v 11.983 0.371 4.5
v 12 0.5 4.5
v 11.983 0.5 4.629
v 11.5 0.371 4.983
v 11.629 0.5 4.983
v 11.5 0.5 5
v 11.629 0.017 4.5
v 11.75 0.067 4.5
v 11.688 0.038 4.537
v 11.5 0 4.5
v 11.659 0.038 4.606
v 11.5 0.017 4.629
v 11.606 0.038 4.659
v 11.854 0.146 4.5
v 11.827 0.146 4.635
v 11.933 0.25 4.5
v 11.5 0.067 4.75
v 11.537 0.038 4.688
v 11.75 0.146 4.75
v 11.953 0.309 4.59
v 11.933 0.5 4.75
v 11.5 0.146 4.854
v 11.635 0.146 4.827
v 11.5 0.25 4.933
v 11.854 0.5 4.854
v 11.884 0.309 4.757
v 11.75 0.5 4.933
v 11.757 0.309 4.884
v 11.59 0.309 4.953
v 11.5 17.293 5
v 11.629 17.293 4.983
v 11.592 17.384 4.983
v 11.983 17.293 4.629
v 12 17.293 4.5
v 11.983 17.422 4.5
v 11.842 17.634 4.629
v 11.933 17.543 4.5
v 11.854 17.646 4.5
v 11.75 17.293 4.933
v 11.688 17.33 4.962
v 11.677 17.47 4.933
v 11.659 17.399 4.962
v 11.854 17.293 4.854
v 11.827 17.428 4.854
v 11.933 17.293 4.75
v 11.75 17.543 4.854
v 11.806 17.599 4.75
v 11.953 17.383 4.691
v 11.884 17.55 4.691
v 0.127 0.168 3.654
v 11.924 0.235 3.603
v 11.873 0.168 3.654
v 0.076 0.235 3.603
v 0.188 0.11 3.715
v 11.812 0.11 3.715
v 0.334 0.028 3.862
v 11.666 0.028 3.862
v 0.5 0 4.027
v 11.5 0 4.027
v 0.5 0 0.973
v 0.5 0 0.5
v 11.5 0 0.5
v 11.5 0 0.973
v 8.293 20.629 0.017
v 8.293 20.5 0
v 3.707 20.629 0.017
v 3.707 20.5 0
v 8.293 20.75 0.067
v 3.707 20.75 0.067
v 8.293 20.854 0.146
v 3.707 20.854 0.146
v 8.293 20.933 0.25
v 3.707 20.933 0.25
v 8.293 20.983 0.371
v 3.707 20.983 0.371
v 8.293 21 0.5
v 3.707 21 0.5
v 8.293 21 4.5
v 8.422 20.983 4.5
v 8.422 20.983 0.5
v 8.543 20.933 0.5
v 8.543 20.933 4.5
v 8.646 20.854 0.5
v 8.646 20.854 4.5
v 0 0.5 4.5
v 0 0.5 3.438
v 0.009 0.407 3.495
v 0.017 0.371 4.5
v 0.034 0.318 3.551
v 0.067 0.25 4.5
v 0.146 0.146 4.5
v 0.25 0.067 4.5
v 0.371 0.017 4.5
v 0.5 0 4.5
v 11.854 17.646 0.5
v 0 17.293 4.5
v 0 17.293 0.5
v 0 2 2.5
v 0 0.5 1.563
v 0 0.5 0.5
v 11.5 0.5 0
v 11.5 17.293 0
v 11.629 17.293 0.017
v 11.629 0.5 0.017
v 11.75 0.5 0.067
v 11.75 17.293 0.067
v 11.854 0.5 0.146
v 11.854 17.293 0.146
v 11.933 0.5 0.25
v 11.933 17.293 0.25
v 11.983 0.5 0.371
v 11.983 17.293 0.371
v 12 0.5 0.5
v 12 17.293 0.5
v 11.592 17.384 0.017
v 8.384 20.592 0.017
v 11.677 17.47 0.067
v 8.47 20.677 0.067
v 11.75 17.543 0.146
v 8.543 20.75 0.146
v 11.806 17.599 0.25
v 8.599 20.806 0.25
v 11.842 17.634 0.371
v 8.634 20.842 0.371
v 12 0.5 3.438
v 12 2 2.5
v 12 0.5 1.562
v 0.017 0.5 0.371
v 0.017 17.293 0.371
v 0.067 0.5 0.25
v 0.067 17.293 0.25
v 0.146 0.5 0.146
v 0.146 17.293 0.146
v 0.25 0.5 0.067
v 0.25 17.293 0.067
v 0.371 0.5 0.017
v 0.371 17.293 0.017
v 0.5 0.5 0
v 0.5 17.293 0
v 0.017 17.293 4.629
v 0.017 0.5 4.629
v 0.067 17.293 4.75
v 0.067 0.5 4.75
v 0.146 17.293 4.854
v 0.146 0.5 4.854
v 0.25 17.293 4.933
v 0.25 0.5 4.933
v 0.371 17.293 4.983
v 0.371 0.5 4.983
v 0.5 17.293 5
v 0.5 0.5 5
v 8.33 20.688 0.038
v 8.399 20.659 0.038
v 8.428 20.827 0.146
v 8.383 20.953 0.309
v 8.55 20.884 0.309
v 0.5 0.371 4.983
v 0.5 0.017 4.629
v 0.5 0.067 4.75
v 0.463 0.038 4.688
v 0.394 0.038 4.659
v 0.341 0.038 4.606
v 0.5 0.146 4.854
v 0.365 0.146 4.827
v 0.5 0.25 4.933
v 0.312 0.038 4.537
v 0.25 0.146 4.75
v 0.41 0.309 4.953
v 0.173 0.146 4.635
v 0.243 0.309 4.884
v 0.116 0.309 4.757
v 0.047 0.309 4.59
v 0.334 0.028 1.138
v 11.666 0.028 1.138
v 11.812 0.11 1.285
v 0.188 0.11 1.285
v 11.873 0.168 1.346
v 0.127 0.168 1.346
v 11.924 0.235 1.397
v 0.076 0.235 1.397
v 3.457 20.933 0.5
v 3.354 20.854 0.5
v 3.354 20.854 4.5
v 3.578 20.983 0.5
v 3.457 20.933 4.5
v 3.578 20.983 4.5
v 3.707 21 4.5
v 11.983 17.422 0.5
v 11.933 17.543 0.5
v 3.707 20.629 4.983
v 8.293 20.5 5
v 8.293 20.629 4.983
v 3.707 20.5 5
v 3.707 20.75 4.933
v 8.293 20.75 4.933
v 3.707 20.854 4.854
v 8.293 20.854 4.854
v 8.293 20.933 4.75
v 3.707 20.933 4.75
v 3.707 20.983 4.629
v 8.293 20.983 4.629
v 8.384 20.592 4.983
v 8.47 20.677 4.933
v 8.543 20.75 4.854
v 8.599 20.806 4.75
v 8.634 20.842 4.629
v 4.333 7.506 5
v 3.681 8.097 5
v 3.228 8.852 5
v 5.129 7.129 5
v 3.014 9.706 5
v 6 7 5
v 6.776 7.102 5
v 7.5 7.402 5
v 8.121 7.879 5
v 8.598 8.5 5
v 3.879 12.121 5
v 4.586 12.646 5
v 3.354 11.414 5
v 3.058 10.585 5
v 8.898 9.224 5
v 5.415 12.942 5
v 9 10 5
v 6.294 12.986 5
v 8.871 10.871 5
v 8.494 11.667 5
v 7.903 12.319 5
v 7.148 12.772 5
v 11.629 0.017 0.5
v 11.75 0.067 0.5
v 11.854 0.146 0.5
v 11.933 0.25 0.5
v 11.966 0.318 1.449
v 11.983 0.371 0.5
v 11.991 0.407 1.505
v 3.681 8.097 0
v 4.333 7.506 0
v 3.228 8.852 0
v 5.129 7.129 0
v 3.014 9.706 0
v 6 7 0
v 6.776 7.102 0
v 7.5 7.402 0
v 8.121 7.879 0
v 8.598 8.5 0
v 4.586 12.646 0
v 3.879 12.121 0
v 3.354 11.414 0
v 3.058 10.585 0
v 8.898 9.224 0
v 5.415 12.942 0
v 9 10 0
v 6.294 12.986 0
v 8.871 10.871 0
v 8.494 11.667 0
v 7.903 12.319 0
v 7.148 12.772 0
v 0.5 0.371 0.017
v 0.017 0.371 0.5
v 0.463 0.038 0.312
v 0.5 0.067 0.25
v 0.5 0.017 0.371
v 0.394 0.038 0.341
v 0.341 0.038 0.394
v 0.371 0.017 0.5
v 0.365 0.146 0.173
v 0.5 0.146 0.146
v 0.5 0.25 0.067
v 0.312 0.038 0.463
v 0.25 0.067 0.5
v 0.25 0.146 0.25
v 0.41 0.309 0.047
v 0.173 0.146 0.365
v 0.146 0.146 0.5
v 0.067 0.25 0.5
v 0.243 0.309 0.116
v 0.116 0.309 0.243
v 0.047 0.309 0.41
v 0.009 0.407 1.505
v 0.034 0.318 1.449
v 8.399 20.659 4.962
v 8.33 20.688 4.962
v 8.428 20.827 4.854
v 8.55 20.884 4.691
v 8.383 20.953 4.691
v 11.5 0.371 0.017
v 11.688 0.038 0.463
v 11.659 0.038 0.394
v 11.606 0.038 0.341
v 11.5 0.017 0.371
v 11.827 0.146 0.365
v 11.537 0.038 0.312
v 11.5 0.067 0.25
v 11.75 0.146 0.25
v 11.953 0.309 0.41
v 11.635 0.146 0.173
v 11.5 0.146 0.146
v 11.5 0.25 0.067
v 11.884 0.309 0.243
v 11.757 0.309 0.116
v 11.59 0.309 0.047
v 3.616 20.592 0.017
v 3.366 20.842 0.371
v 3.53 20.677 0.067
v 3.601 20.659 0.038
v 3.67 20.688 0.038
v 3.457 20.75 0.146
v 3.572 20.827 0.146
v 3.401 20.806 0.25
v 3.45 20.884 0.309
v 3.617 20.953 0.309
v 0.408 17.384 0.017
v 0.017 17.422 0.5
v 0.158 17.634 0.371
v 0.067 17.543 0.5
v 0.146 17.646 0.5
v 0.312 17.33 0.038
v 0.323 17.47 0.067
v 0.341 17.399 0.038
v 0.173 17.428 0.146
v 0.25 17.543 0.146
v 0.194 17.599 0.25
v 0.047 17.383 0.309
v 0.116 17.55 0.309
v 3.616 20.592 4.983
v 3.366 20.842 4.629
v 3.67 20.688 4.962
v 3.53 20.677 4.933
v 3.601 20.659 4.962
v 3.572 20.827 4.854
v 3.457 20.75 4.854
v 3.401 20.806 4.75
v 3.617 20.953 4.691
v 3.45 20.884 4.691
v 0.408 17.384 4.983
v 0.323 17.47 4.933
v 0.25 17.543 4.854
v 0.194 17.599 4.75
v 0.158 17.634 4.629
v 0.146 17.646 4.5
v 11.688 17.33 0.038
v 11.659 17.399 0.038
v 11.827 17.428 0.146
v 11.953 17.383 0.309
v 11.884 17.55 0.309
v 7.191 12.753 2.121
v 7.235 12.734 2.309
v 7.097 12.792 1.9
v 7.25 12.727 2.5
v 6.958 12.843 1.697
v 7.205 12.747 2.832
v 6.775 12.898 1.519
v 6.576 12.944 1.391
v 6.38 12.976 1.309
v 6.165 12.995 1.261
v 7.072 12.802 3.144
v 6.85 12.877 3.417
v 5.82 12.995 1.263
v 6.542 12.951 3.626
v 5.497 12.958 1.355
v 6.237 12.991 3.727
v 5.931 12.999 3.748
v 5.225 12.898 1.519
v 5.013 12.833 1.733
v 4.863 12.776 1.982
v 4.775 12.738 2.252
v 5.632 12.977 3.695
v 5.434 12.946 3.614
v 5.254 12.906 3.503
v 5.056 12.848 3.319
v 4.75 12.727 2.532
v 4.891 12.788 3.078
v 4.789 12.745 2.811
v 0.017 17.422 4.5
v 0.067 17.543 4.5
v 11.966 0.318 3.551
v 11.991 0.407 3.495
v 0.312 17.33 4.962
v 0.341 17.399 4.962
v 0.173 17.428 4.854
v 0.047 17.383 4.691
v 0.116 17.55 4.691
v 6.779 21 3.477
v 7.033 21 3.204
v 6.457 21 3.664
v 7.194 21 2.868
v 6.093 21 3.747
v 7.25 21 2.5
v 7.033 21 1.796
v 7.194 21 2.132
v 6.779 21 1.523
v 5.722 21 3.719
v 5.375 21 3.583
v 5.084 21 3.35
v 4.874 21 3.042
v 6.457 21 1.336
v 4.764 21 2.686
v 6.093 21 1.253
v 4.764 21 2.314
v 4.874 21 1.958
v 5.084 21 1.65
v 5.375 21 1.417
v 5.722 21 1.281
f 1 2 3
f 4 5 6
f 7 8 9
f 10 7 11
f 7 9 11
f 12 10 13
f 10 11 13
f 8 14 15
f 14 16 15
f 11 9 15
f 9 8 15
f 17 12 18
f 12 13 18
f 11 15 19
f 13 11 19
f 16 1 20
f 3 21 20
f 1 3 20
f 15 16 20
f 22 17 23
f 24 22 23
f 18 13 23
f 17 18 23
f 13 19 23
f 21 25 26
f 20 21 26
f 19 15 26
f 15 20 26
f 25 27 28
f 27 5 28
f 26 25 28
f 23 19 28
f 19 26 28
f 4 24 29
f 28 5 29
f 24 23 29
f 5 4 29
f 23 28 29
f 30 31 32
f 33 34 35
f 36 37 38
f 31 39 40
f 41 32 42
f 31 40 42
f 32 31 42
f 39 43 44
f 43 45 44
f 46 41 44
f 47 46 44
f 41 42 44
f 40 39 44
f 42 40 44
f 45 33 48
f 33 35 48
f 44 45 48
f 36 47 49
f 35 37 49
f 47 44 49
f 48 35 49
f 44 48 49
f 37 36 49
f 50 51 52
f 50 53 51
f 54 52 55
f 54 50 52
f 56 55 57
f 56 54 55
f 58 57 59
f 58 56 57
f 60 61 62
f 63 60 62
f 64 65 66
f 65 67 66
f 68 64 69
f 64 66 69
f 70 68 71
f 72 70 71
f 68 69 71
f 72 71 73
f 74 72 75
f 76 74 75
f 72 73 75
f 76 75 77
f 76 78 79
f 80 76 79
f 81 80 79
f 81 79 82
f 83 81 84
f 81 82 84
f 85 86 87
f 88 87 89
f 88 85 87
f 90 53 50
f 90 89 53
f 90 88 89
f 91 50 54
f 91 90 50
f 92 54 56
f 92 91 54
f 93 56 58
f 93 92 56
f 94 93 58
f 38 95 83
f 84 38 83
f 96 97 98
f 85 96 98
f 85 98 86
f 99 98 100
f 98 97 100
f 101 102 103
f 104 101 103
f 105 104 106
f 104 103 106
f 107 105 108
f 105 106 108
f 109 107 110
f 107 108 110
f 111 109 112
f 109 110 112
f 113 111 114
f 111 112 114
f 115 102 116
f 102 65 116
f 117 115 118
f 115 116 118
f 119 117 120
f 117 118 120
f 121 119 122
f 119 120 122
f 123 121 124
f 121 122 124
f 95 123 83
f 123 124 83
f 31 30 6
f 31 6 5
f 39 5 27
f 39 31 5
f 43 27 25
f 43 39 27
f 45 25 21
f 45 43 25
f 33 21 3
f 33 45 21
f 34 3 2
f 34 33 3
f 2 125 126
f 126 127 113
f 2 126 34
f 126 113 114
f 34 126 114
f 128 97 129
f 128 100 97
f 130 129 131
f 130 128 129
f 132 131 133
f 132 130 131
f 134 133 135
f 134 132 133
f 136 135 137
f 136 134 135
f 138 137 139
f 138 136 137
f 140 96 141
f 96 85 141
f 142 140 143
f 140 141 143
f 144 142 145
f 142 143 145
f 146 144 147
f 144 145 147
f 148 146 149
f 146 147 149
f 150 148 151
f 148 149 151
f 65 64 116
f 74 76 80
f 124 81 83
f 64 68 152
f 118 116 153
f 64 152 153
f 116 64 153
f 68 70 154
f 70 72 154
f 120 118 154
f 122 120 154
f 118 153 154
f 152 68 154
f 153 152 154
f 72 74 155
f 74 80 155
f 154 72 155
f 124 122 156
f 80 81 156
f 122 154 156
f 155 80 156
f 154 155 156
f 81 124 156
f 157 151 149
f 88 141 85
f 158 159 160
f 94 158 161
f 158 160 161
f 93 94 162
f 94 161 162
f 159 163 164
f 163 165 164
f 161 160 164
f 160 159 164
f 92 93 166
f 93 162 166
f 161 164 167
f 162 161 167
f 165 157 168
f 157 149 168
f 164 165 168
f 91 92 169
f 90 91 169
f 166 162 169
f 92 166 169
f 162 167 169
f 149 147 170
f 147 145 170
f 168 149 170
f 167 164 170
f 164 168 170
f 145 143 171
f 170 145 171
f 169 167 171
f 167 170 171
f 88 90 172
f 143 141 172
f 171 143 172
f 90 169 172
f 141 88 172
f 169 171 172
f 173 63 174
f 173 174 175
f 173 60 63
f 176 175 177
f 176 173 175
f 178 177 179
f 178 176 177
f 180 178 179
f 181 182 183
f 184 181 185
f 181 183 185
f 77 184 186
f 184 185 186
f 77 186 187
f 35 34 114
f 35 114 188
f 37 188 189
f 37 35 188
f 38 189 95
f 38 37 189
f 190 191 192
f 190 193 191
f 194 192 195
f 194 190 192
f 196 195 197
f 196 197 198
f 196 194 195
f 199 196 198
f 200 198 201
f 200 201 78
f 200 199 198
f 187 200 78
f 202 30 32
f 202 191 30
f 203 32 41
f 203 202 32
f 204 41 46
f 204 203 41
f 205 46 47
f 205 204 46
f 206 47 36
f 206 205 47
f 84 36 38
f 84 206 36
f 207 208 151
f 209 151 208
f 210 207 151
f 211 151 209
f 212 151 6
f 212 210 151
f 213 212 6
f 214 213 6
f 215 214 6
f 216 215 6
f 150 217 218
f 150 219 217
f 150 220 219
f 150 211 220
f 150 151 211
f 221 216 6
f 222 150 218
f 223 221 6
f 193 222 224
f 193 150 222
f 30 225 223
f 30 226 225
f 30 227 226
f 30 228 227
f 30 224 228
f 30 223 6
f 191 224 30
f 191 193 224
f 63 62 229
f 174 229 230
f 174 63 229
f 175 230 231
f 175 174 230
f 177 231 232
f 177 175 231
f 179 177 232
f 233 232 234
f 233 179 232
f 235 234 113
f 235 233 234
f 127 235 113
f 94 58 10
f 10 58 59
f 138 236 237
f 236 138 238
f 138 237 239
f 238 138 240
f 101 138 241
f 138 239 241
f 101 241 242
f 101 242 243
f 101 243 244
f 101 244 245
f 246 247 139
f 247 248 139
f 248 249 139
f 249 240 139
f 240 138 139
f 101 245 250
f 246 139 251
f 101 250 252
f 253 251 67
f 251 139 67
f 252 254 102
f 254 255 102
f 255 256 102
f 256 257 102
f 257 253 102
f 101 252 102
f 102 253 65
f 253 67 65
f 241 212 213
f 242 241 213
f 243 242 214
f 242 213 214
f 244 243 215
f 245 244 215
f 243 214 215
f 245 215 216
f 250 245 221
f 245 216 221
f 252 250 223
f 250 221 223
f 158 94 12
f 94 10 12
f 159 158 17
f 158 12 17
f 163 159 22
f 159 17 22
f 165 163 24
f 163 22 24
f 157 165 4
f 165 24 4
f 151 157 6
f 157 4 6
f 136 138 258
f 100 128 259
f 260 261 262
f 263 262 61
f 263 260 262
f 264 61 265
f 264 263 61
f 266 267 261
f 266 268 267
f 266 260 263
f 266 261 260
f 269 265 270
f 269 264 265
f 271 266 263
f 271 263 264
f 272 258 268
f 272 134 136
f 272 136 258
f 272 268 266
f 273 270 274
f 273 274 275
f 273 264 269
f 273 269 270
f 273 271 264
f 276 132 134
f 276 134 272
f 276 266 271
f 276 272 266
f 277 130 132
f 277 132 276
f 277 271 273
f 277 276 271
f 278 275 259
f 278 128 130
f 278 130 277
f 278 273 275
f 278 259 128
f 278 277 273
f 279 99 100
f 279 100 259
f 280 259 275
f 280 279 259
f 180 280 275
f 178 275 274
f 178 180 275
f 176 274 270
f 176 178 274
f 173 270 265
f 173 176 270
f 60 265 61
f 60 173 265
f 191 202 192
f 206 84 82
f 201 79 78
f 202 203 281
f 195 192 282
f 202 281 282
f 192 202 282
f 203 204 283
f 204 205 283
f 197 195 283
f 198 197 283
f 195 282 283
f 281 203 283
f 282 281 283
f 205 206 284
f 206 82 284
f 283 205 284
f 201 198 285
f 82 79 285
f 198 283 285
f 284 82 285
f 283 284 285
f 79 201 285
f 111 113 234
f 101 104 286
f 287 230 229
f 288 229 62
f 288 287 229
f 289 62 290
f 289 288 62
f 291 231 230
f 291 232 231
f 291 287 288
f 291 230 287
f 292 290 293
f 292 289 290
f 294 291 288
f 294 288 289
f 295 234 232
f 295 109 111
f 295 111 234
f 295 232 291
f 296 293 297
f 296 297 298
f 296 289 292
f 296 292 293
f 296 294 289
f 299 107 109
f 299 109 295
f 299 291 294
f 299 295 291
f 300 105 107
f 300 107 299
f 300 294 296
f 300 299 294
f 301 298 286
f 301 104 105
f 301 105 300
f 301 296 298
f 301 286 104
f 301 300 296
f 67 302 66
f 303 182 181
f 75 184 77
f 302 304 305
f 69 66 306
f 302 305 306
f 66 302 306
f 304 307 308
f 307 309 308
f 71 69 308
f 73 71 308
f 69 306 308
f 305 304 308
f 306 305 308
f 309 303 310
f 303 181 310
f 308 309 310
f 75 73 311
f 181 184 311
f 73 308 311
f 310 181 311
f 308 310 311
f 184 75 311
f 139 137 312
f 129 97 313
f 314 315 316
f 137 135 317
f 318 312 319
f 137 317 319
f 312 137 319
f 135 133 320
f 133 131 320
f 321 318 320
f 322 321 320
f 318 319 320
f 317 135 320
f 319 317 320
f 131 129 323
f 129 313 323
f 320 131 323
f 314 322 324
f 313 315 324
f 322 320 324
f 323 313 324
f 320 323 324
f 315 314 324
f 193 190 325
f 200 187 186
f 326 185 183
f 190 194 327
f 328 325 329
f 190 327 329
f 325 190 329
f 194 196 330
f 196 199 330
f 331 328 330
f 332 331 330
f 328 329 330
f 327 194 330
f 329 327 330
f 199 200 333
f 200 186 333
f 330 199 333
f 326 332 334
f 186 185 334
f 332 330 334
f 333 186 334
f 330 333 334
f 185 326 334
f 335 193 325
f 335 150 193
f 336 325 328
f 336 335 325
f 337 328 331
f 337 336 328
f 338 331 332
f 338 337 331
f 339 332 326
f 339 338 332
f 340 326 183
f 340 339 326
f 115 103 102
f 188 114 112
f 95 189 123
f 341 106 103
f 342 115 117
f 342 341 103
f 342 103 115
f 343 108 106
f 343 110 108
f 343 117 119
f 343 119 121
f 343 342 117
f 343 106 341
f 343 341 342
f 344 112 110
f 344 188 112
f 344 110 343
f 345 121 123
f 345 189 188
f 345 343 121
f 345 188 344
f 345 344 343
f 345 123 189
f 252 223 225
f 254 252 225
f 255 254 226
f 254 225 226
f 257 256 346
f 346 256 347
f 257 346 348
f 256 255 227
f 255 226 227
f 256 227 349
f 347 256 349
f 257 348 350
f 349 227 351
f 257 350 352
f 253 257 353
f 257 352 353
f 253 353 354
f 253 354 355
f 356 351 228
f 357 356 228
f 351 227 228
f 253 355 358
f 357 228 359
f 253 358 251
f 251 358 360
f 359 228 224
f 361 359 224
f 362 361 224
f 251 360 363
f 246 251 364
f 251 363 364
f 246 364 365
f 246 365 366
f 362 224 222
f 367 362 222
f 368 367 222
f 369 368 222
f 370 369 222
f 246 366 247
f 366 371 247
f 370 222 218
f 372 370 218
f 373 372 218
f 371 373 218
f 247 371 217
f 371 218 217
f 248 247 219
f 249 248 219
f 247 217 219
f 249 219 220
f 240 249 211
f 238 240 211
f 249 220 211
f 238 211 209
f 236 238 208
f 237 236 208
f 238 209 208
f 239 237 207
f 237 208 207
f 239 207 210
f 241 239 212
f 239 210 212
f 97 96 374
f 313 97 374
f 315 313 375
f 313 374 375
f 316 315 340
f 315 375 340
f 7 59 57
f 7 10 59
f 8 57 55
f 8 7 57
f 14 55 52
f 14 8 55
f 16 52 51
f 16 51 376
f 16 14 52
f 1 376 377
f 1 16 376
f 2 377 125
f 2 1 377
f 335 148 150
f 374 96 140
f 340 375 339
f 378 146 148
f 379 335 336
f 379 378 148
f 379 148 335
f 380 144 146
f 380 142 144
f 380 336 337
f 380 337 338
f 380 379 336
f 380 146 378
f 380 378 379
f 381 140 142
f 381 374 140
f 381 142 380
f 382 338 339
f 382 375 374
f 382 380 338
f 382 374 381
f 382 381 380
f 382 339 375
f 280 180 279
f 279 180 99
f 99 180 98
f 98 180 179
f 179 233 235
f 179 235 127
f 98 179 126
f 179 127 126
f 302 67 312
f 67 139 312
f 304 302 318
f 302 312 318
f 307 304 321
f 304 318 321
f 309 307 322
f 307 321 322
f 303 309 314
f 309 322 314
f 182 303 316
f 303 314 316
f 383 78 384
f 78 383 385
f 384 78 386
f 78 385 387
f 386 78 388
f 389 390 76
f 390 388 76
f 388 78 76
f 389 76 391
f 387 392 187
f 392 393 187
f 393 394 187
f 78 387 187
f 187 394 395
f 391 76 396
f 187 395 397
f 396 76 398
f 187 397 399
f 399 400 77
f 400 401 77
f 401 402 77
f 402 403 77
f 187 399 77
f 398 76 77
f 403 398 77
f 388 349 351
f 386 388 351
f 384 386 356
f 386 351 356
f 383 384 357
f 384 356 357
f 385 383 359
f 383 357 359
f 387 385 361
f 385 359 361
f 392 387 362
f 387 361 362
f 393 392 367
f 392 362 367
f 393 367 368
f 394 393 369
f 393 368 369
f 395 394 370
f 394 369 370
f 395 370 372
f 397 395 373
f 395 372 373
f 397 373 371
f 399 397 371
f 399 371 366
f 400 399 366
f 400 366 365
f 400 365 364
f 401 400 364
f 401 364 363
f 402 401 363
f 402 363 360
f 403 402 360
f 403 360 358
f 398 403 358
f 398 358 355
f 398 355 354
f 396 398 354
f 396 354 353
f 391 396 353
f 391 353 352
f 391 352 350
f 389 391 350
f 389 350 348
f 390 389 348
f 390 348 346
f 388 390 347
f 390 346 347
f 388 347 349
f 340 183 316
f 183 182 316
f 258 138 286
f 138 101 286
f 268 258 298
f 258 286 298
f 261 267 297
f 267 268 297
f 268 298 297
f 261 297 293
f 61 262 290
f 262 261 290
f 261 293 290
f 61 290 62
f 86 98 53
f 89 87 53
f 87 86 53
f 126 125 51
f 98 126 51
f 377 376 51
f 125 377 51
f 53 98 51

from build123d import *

# Parameters (mm, degrees)
F1_DEPTH = 5
F3_DEPTH = 12.001
F5_DEPTH = 5.001
F7_D     = 2.5
F7_DEPTH = 12
F7_TIP   = 0.7510757738
F8_R     = 0.5


with BuildPart() as f1:
    # F0 (on Top) → F1 (new body)
    with BuildSketch(Plane.XY):
        Polygon((0, 17.5), (0, 0), (12, 0), (12, 17.5), (8.5, 21), (3.5, 21), align=None)
    extrude(amount=F1_DEPTH)

    # F2 (on face) → F3 (cut, through all)
    with BuildSketch(Plane.YZ.offset(12)):
        Polygon((0, 3.75), (0, 2.5), (0, 1.25), (2, 2.5), align=None)
    extrude(amount=-F3_DEPTH, mode=Mode.SUBTRACT)

    # F4 (on face) → F5 (cut, through all)
    with BuildSketch(Plane.XY.offset(5)):
        with BuildLine():
            ThreePointArc((9, 10), (3.8786796564, 12.1213203436), (6, 7))
            ThreePointArc((6, 7), (8.1213203436, 7.8786796564), (9, 10))
        make_face()
    extrude(amount=-F5_DEPTH, mode=Mode.SUBTRACT)

    # F7
    with Locations(Plane(origin=(0, 21, 0), x_dir=(-1, 0, 0), z_dir=(0, 1, 0))):
        with Locations((-6, 2.5)):
            Hole(F7_D / 2, depth=F7_DEPTH)
            with Locations((0, 0, -(F7_DEPTH + F7_TIP / 2))):  # 118° drill point
                Cone(0, F7_D / 2, F7_TIP, mode=Mode.SUBTRACT)

    # F8
    f8_edges = [f1.edges().sort_by_distance(p)[0] for p in [
        (1.75, 19.25, 5),
        (3.5, 21, 2.5),
        (1.75, 19.25, 0),
        (6, 21, 5),
        (8.5, 21, 2.5),
        (6, 21, 0),
        (10.25, 19.25, 0),
        (10.25, 19.25, 5),
        (12, 17.5, 2.5),
        (0, 17.5, 2.5),
        (0, 8.75, 5),
        (0, 8.75, 0),
        (12, 8.75, 5),
        (12, 8.75, 0),
        (12, 0, 0.625),
        (6, 0, 1.25),
        (6, 0, 0),
        (12, 0, 4.375),
        (6, 0, 3.75),
        (6, 0, 5),
        (0, 0, 4.375),
        (0, 0, 0.625),
    ]]
    fillet(f8_edges, radius=F8_R)


solid = f1.part
